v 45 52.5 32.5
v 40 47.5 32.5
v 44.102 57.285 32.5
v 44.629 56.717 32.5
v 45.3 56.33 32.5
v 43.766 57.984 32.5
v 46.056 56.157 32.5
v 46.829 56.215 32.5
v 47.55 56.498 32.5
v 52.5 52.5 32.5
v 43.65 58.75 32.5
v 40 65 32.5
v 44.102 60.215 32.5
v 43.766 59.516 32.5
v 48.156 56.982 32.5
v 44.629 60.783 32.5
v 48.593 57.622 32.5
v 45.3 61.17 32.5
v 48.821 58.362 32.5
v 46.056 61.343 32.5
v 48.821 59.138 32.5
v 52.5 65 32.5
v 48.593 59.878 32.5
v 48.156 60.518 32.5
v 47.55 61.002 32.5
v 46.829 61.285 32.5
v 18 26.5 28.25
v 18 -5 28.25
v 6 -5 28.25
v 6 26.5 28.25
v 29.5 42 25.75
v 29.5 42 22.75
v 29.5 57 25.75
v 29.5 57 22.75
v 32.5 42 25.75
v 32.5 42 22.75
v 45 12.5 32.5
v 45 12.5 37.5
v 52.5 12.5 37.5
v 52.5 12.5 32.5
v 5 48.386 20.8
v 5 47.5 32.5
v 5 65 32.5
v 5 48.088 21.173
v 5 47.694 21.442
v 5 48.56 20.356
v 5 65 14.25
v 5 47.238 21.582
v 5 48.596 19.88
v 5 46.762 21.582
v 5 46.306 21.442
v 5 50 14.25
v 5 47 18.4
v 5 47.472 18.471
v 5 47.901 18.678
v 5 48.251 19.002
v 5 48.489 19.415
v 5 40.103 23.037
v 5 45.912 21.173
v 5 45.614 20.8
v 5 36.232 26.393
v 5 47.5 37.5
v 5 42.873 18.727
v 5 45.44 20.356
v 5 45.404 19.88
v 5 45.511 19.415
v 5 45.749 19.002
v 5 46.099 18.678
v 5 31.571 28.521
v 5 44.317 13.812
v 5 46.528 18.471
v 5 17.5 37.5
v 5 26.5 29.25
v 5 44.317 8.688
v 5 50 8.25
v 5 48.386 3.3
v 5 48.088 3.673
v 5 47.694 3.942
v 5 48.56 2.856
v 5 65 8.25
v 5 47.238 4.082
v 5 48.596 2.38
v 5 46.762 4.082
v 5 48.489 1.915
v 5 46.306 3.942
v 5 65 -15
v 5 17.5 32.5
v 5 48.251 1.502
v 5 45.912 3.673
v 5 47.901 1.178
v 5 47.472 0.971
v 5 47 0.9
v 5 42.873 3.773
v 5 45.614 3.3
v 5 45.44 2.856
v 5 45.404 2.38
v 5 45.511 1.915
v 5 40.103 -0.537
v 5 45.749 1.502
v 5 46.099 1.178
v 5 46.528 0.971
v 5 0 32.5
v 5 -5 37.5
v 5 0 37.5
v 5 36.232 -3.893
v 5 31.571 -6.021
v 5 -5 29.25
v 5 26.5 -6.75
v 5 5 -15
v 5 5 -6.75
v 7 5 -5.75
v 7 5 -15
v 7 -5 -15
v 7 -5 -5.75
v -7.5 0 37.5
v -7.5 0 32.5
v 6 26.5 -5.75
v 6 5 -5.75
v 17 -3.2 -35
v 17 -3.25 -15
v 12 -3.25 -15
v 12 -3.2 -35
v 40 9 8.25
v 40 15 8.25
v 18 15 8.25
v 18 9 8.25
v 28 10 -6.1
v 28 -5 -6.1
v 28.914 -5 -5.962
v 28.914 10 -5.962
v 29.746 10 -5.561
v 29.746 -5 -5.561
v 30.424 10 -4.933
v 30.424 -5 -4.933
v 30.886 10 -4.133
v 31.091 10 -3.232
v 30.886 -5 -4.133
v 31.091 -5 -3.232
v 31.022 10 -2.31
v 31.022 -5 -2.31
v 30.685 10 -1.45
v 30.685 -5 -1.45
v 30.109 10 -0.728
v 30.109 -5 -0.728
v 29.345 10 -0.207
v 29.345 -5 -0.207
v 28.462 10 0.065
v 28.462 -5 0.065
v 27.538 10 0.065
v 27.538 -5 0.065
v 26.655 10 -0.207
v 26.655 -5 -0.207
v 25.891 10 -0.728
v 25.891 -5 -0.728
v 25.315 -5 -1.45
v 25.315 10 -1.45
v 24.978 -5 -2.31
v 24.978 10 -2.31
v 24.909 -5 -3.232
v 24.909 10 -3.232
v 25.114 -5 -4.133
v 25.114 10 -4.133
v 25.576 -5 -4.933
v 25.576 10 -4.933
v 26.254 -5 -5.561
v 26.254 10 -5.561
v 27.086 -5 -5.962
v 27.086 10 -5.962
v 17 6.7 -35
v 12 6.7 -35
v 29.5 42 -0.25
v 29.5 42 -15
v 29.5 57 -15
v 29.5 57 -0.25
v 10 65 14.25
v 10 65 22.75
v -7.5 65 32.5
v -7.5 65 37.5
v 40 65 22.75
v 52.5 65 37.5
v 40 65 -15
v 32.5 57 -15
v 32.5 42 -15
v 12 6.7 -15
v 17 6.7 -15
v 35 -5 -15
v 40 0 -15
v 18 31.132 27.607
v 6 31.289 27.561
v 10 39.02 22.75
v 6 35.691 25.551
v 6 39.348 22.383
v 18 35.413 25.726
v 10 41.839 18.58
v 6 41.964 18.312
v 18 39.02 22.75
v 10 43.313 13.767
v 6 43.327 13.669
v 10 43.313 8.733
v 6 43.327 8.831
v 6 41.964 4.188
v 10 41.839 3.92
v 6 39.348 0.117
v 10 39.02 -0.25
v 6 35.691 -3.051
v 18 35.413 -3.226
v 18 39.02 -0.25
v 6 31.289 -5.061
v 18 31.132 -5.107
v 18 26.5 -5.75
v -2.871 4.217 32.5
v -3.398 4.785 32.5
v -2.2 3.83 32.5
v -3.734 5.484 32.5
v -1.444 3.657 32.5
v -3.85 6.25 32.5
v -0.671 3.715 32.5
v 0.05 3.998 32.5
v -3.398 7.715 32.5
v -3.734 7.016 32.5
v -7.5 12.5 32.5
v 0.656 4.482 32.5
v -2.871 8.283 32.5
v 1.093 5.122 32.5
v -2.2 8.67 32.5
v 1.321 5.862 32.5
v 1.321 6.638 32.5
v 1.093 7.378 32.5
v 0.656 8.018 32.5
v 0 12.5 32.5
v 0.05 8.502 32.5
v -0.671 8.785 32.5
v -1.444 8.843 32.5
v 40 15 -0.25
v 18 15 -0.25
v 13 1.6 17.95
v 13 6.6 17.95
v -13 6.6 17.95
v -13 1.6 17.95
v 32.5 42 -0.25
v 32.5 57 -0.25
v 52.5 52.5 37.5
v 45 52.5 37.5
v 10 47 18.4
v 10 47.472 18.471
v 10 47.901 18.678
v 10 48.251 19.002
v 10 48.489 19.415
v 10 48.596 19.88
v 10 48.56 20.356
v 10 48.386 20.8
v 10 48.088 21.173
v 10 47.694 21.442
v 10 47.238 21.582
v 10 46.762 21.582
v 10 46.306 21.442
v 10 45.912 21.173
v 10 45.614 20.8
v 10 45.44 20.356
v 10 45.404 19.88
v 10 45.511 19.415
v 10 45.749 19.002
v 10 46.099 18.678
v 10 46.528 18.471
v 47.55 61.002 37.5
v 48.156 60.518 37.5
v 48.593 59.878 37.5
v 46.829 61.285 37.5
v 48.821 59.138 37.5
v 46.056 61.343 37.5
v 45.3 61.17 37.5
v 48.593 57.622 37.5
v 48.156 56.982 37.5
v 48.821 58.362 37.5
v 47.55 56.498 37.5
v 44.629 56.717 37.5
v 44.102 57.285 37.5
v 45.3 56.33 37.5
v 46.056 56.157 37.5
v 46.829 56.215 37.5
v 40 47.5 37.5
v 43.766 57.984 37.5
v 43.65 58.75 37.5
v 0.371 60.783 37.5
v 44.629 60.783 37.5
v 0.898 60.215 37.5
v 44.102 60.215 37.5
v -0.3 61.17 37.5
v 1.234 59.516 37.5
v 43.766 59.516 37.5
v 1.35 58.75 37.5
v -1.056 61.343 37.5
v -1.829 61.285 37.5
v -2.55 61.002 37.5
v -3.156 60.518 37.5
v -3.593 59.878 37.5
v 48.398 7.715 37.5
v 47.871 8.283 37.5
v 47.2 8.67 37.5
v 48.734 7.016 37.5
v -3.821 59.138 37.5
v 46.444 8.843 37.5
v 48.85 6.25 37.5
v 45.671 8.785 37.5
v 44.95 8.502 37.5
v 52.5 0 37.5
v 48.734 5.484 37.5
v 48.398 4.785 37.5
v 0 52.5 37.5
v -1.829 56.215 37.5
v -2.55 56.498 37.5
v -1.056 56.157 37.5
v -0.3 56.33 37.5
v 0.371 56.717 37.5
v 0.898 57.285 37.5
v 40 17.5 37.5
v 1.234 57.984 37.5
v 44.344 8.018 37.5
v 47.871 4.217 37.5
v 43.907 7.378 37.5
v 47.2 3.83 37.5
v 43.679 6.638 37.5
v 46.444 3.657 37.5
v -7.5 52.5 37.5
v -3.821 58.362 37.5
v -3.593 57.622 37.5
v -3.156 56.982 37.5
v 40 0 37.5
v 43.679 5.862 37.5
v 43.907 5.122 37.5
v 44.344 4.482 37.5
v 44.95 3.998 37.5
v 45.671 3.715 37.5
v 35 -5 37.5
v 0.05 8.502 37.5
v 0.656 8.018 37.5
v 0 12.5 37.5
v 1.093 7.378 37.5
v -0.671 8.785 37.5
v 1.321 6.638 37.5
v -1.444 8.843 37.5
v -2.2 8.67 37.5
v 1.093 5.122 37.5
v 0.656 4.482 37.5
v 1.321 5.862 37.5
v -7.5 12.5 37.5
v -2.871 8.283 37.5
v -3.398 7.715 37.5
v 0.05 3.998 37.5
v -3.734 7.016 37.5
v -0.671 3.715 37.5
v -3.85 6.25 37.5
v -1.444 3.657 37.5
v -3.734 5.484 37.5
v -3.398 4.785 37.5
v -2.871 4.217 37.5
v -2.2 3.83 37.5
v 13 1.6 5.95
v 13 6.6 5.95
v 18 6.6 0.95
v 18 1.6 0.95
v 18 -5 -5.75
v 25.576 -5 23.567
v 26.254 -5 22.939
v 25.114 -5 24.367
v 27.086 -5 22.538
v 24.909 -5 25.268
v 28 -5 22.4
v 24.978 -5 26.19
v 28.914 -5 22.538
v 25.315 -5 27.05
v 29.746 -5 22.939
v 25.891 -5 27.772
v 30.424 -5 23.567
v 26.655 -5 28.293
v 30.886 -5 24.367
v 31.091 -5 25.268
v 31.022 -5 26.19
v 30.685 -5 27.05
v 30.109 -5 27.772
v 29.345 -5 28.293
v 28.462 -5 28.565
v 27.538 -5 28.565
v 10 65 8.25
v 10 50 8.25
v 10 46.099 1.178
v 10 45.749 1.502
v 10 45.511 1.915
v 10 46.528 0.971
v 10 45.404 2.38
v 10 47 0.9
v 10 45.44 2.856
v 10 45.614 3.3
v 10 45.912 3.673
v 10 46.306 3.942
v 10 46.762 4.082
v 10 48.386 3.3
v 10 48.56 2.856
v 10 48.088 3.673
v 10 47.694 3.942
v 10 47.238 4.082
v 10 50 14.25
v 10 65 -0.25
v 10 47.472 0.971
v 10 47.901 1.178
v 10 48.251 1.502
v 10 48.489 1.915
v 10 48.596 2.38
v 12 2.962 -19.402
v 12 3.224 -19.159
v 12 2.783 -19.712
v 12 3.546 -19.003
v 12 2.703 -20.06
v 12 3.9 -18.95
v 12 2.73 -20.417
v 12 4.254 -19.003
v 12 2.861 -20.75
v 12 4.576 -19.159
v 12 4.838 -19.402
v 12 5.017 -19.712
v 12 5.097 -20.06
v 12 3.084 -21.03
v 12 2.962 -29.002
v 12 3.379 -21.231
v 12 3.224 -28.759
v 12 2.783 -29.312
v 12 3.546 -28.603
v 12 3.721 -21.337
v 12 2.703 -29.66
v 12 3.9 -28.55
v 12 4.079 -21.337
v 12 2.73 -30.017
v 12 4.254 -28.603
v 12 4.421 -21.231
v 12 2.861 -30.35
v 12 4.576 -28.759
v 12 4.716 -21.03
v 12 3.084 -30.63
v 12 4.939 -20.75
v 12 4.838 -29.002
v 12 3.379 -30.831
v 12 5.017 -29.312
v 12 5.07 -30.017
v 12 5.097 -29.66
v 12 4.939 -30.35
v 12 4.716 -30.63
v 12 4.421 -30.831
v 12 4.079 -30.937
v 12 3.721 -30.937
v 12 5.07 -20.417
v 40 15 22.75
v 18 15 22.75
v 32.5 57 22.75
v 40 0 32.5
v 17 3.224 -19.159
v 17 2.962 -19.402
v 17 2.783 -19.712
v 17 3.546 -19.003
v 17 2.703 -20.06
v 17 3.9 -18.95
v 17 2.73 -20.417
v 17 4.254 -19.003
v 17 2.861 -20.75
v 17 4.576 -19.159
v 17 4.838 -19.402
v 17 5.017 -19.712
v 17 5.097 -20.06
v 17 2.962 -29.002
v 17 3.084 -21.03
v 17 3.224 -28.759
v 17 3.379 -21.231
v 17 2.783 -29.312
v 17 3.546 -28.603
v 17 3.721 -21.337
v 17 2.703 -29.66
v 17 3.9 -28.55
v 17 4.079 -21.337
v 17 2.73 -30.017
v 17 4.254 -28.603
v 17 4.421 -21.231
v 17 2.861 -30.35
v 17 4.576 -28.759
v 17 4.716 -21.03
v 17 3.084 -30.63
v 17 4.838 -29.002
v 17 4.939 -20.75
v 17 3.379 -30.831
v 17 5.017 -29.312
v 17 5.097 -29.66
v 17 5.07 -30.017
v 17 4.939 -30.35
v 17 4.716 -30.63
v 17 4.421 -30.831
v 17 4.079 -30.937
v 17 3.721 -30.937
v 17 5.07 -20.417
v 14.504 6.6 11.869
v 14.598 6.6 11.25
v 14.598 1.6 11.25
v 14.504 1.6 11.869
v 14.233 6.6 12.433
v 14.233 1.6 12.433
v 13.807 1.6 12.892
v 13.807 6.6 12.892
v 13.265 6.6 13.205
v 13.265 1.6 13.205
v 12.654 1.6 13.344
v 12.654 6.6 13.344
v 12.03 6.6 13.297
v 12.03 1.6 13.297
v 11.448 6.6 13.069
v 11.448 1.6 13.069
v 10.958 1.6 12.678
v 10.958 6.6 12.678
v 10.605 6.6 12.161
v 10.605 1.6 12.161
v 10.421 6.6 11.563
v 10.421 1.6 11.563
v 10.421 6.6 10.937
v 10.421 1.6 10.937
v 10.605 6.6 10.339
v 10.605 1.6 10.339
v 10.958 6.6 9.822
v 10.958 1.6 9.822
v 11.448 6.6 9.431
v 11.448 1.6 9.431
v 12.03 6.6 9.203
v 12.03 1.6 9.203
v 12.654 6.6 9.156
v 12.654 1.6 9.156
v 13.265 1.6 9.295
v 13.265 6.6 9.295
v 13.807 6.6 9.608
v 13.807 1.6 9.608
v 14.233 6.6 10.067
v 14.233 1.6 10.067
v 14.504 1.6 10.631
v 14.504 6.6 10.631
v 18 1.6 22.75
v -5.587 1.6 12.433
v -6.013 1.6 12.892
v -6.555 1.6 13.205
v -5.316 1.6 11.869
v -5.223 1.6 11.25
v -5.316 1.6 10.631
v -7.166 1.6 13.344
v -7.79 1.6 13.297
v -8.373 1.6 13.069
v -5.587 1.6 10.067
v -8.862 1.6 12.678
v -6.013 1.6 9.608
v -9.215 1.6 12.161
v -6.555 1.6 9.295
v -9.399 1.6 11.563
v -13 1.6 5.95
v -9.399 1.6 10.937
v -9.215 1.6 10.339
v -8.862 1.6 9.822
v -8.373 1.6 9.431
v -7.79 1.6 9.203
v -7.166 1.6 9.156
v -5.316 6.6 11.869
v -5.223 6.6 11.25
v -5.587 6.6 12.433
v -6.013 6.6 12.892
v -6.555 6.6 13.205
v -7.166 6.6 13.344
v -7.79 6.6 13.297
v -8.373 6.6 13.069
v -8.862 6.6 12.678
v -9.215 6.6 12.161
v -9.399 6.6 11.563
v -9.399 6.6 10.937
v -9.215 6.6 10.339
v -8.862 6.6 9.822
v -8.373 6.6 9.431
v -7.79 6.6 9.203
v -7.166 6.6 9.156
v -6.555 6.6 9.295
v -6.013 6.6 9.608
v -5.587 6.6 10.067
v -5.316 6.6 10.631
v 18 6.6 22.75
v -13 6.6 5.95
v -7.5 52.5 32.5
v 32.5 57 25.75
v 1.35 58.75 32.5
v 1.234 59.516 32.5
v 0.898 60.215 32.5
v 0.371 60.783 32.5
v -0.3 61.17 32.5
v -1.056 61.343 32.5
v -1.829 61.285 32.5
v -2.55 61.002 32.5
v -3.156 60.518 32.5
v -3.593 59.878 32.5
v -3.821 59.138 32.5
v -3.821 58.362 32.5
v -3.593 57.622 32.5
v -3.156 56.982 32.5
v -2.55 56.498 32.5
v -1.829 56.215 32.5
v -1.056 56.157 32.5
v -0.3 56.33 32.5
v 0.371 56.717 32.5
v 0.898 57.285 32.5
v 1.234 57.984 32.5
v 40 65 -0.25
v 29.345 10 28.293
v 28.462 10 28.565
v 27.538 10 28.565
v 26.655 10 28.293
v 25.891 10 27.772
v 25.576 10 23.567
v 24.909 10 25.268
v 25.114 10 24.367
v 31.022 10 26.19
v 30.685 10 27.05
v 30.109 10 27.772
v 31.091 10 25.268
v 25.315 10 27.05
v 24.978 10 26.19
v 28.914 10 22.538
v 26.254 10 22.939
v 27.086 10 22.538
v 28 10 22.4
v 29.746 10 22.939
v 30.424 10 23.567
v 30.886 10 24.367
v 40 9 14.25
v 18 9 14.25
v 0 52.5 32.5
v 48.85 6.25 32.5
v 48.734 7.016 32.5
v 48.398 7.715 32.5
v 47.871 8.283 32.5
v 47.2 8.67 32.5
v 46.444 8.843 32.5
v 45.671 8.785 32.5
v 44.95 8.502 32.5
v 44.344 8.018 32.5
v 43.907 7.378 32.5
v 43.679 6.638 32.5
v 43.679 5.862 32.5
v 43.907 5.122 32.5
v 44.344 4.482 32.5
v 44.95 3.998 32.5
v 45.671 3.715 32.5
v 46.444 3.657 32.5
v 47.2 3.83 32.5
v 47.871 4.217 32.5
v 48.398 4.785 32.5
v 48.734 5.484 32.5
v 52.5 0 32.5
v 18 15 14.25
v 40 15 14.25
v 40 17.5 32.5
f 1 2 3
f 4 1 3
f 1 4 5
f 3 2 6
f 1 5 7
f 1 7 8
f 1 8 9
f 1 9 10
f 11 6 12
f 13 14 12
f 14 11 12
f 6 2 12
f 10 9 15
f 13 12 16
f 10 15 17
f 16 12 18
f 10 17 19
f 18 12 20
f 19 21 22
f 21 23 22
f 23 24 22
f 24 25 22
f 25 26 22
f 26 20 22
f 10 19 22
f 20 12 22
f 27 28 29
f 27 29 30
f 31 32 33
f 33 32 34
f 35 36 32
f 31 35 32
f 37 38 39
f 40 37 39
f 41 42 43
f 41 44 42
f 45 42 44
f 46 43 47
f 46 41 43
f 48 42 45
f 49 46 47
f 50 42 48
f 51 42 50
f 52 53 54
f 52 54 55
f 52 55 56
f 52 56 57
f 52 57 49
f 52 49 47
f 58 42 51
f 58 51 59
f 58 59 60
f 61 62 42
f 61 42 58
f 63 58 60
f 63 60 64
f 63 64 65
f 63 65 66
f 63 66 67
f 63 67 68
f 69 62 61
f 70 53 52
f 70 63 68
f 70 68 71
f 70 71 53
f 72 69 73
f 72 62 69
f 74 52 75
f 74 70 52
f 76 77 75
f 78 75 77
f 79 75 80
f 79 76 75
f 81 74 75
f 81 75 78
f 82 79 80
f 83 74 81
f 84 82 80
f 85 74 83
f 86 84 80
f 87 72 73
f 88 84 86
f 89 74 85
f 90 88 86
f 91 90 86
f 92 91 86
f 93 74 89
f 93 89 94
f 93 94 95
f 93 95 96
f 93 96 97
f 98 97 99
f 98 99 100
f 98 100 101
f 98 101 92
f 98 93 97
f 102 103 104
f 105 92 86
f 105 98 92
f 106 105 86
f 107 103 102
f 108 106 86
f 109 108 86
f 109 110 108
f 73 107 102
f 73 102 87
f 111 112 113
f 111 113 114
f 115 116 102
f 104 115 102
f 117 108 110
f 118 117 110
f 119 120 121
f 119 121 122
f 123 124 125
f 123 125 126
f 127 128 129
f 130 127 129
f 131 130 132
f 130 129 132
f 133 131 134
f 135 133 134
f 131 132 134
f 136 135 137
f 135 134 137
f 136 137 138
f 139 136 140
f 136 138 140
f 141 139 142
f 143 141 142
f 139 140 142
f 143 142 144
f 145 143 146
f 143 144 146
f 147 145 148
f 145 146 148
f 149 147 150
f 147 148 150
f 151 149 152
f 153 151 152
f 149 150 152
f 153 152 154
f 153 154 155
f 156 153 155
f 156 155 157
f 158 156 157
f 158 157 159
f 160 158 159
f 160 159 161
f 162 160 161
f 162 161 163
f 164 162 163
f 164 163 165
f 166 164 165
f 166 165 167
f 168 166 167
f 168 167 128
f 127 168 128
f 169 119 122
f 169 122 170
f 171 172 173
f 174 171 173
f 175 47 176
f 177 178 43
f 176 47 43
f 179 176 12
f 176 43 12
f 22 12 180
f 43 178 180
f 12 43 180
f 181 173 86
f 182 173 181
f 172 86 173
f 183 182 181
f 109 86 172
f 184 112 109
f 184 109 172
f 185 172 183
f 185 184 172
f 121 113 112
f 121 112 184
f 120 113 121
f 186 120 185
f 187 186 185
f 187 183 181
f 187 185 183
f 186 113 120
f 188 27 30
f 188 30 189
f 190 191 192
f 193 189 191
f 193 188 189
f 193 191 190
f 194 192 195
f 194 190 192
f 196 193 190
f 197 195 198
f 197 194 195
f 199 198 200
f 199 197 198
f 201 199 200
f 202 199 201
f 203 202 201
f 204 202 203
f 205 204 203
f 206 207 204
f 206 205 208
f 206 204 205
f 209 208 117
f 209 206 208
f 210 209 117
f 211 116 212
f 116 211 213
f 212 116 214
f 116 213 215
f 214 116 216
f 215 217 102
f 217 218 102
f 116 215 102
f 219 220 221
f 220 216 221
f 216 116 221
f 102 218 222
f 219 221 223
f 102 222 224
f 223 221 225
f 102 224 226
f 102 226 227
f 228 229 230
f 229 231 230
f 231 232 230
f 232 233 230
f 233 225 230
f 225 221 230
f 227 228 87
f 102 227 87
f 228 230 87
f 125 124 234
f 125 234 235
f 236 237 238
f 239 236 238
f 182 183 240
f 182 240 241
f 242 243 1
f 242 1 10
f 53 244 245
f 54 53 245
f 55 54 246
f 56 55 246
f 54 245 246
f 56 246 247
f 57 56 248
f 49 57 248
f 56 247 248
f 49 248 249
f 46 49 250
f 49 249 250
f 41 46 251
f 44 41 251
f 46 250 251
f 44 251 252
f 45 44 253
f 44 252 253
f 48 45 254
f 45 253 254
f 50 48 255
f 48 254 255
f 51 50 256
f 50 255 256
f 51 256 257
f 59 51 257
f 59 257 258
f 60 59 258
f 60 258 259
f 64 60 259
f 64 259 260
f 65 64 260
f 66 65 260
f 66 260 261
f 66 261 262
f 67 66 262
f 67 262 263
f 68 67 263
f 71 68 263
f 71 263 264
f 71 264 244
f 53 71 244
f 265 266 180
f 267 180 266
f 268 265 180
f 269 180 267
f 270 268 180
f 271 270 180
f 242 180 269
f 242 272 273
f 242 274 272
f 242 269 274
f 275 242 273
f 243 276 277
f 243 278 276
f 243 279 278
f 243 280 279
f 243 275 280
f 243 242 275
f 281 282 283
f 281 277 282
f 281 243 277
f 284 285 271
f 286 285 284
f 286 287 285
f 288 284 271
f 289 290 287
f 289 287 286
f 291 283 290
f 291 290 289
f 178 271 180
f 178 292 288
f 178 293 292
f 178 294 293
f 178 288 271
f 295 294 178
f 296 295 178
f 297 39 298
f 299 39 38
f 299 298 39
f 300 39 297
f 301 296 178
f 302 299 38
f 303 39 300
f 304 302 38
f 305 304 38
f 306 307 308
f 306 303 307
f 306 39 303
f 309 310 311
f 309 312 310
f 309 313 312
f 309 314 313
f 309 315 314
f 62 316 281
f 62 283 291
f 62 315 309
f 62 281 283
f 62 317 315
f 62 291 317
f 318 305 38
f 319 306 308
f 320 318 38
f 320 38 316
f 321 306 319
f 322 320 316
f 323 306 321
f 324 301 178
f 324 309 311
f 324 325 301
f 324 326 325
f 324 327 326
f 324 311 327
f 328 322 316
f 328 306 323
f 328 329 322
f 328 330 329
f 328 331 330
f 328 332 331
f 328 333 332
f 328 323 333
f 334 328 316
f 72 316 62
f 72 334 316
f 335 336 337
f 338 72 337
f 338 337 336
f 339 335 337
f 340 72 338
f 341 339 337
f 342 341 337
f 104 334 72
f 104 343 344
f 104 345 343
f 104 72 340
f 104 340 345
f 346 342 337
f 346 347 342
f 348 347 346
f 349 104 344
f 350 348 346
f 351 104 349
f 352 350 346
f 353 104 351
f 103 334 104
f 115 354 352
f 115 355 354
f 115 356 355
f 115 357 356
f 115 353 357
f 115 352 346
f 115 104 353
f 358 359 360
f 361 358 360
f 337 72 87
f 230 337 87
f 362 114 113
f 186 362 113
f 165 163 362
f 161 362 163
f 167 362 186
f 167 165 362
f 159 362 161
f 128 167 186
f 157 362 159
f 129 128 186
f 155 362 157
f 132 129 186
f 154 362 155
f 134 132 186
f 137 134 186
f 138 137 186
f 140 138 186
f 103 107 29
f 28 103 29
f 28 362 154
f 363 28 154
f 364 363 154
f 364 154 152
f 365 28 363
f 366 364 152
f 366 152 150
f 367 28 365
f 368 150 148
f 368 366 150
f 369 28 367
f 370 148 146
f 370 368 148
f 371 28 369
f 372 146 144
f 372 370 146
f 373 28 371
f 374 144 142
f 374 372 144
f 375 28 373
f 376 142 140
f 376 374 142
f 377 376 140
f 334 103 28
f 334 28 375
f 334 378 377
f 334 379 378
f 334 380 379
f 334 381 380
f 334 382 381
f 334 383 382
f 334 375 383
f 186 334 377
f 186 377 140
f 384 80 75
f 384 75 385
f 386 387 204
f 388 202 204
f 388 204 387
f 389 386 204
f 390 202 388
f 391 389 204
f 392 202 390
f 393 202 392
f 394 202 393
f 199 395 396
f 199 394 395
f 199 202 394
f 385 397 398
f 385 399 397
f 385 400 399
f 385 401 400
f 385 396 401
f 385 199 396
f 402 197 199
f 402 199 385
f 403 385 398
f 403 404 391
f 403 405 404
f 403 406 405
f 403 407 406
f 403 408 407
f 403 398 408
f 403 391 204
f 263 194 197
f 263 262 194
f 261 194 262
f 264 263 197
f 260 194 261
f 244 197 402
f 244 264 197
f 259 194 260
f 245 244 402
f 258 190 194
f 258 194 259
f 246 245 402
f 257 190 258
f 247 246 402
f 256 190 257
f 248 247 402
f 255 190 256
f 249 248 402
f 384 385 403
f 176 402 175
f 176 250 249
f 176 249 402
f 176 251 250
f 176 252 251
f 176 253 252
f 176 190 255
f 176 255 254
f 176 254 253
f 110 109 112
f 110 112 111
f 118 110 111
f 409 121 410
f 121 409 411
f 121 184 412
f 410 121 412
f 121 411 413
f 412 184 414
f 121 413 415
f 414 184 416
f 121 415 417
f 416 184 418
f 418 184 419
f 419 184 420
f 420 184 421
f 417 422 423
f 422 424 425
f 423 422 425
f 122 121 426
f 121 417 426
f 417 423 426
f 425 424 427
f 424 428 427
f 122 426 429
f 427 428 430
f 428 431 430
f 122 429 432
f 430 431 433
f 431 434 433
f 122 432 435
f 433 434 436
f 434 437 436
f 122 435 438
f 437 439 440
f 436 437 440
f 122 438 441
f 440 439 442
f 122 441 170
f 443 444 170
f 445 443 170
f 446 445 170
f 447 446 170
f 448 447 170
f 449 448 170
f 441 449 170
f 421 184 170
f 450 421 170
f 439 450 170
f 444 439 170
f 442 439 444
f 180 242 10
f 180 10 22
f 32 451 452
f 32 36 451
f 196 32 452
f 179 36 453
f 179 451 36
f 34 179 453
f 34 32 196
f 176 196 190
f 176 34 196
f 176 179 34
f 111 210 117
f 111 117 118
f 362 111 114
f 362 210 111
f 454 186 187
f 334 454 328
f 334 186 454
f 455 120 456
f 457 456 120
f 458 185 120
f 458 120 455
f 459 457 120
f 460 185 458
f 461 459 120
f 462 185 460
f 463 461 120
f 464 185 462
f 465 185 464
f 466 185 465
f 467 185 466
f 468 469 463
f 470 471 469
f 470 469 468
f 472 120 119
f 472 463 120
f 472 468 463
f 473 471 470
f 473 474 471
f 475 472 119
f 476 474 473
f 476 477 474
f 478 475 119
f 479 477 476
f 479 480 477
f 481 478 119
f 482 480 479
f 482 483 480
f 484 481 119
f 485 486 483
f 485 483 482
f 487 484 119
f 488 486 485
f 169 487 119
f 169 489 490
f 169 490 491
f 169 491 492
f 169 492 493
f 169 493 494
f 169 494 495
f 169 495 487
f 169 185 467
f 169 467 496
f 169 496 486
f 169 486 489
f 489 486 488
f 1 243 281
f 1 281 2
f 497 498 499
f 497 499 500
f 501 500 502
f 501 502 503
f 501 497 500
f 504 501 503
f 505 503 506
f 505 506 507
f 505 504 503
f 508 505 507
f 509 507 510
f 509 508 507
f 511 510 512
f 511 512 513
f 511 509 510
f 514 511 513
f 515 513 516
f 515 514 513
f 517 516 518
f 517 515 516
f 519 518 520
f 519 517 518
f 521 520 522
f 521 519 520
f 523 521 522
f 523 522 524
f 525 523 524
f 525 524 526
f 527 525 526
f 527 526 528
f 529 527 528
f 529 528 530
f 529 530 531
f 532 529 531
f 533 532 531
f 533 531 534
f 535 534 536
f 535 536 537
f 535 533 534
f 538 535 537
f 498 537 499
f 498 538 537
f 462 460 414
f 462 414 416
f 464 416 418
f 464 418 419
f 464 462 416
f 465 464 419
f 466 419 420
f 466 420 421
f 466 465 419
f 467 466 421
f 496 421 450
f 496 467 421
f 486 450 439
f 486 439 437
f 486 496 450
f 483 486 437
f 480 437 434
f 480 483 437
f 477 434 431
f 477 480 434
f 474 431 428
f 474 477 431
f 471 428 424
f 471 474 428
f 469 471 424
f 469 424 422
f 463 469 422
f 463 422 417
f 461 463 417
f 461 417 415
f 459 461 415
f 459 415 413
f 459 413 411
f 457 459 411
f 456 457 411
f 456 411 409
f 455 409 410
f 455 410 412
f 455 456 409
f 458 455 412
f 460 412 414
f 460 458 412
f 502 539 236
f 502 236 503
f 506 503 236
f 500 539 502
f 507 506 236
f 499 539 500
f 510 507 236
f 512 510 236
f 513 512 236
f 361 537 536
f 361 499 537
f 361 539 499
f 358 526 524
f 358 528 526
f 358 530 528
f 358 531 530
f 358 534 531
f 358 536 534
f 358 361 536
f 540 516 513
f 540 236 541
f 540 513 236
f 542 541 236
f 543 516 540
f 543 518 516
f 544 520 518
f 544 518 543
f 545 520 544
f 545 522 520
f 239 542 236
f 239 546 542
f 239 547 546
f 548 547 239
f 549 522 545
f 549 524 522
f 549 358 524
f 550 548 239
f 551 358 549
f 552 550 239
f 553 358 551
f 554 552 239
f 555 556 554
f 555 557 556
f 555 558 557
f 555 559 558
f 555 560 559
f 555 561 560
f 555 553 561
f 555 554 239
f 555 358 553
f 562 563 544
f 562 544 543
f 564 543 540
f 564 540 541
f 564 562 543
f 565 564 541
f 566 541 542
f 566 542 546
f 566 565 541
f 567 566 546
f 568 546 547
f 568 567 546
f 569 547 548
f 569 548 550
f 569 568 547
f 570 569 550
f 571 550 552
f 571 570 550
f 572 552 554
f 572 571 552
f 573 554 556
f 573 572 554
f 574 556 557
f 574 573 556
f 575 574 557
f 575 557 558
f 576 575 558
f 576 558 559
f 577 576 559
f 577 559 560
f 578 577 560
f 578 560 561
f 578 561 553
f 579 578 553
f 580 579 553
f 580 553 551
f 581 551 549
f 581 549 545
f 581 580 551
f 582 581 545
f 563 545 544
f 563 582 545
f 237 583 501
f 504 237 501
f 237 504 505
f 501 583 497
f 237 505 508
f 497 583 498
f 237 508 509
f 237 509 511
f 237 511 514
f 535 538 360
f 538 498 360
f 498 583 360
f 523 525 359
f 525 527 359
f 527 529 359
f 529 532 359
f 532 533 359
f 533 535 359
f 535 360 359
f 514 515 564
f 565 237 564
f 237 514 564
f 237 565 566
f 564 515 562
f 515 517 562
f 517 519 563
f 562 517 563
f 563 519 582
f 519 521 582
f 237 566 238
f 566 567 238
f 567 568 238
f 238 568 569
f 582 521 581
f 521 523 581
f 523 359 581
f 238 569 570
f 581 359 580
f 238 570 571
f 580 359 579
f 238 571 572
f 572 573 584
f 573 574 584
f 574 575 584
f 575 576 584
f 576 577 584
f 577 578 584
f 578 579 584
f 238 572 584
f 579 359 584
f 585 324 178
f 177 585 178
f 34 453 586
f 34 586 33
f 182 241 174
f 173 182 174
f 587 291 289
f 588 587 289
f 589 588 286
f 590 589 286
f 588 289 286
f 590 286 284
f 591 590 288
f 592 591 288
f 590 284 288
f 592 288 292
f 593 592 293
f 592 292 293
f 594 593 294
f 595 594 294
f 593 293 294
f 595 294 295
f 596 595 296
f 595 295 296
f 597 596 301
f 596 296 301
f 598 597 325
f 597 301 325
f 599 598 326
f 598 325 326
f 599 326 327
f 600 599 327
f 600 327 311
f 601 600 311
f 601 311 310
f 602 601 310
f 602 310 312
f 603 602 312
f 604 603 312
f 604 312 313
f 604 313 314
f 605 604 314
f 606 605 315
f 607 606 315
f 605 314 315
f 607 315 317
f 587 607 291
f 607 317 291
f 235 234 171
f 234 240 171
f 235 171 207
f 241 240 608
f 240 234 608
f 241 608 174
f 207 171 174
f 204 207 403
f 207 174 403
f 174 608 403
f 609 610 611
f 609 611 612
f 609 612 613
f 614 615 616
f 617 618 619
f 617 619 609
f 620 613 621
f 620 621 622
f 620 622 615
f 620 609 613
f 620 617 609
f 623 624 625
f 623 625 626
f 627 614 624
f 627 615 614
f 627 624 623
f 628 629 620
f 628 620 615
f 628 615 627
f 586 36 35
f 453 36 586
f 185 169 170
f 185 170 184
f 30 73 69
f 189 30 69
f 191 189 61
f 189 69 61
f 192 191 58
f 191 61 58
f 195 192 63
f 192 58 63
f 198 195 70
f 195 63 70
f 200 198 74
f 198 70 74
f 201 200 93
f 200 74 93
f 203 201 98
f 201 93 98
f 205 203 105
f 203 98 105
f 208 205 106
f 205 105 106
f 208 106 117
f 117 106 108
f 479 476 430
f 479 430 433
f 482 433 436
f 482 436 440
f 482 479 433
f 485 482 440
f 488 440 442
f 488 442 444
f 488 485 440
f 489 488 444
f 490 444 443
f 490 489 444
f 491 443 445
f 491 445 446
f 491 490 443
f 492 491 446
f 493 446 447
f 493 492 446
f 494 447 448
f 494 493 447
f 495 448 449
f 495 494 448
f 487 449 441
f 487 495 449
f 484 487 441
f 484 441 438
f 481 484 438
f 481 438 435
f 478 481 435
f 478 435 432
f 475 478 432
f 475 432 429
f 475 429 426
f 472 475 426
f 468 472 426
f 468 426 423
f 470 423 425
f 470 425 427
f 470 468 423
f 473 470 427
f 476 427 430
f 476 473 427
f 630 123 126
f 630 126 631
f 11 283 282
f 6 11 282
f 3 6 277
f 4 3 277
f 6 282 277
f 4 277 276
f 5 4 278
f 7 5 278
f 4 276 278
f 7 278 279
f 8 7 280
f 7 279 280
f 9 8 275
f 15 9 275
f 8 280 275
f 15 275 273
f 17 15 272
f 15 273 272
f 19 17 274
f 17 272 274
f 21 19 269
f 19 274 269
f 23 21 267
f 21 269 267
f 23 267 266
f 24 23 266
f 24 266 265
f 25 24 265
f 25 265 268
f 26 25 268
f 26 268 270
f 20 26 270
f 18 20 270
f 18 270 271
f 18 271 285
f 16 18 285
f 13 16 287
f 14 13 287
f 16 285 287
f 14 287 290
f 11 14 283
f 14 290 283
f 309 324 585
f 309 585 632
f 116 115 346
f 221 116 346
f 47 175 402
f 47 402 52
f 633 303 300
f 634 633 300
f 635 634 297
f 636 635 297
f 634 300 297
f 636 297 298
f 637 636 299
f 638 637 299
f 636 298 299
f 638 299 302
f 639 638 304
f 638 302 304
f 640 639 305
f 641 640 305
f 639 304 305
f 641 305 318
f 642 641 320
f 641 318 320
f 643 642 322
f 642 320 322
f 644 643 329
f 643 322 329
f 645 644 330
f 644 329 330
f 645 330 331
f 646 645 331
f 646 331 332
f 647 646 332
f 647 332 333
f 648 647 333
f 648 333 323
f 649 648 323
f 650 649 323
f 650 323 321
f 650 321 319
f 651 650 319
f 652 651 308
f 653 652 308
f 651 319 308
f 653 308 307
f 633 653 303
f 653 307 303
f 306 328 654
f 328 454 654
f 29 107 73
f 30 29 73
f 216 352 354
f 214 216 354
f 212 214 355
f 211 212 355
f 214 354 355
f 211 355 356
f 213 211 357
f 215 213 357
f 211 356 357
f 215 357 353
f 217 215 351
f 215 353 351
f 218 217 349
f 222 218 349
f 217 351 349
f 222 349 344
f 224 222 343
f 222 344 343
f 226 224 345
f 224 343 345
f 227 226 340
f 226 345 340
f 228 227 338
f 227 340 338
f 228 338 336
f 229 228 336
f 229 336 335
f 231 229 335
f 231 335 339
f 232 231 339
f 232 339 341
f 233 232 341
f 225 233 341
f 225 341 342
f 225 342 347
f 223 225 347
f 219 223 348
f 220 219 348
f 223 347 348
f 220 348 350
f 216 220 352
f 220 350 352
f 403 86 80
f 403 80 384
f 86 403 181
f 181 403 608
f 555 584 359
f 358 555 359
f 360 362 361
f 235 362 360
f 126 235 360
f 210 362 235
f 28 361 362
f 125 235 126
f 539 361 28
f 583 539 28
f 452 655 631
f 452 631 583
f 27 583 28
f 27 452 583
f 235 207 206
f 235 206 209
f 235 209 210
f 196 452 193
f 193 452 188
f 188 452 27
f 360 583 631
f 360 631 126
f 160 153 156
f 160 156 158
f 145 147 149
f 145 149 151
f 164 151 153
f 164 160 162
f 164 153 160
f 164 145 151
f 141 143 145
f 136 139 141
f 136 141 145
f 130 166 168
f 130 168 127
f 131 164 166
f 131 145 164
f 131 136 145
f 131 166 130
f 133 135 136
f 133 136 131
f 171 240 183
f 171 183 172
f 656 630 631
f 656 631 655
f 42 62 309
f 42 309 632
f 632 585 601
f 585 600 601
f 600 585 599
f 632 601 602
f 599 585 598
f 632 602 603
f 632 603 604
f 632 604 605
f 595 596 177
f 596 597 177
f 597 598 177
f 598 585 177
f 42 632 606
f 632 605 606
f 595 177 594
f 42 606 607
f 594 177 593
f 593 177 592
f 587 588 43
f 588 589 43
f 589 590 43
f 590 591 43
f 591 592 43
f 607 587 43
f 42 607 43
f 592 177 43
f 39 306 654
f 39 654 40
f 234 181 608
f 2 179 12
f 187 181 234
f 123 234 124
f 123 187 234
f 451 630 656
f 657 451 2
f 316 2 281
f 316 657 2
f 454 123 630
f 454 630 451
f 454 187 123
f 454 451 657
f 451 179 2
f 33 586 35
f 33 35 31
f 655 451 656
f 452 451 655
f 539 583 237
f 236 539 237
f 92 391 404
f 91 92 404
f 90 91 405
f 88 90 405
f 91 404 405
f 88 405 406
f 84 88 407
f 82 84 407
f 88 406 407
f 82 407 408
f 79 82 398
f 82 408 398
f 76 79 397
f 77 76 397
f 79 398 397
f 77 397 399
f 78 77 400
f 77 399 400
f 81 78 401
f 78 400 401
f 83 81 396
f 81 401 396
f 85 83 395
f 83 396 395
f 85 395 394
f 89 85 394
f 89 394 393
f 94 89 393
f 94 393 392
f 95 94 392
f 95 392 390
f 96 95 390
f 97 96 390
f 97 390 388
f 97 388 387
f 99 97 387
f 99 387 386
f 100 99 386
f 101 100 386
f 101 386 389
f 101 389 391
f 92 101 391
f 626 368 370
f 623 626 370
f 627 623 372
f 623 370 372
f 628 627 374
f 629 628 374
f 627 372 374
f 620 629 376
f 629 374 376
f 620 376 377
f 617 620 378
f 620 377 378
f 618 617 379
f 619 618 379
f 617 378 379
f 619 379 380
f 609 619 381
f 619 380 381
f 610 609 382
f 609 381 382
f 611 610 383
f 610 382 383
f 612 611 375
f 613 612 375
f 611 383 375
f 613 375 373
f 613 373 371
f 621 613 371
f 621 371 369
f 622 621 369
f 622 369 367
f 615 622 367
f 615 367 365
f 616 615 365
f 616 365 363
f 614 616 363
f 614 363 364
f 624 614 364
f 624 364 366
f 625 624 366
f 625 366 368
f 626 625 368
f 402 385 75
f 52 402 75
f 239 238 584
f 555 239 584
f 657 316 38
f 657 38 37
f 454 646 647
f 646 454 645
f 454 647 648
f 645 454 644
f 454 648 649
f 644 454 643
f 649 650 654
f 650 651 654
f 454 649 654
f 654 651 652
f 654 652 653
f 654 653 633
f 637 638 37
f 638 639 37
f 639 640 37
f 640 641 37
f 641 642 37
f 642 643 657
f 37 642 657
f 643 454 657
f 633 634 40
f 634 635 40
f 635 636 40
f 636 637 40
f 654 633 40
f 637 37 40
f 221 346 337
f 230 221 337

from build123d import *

# Parameters (mm, degrees)
BOSS_EXTRUDE1_DEPTH      = 42.5
BOSS_EXTRUDE1_DEPTH_BACK = 15
SKETCH1_W                = 40
SKETCH1_H                = 65
SKETCH3_W                = 22.5
SKETCH3_H                = 50
CUT_EXTRUDE2_DEPTH       = 30
SKETCH4_R                = 4.5
CUT_EXTRUDE3_DEPTH       = 10
SKETCH6_W                = 40
SKETCH6_H                = 65
CUT_EXTRUDE4_DEPTH       = 5
SKETCH7_R                = 3.1
CUT_EXTRUDE5_DEPTH       = 10
SKETCH8_W                = 52.5
SKETCH8_H                = 65
CUT_EXTRUDE6_DEPTH       = 5
SKETCH9_W                = 12.5
SKETCH9_H                = 12.5
SKETCH9_R                = 2.6
BOSS_EXTRUDE2_DEPTH      = 5
BOSS_EXTRUDE3_START      = 5
SKETCH10_R               = 3.1
BOSS_EXTRUDE3_DEPTH      = 5
SKETCH11_R               = 1.6
CUT_EXTRUDE7_DEPTH       = 87.240941553
CUT_EXTRUDE8_DEPTH       = 11.5
CUT_EXTRUDE8_DEPTH_BACK  = 11.5
SKETCH12_W               = 30
SKETCH12_H               = 50
CUT_EXTRUDE9_DEPTH       = 30
CUT_EXTRUDE10_DEPTH      = 15
CUT_EXTRUDE11_START      = -13
SKETCH15_R               = 17
SKETCH15_R_2             = 4.5
CUT_EXTRUDE11_DEPTH      = 13
CHAMFER1_SIZE            = 1
SKETCH16_W               = 9.25
SKETCH16_H               = 10
CUT_EXTRUDE12_DEPTH      = 2
SKETCH17_R               = 2.1
BOSS_EXTRUDE4_DEPTH      = 5
CHAMFER2_SIZE            = 5
CHAMFER3_SIZE            = 5
CHAMFER4_SIZE            = 5
SKETCH18_W               = 3
SKETCH18_H               = 15
CUT_EXTRUDE13_DEPTH      = 40.75
SKETCH20_R               = 1.2
BOSS_EXTRUDE5_DEPTH      = 5


with BuildPart() as part:
    # Sketch1 → Boss-Extrude1 (new, two sides: drawn at the far end of the back side and taken through both)
    with BuildSketch(Plane.XY.offset(-BOSS_EXTRUDE1_DEPTH_BACK)):
        with Locations((20, 32.5)):
            Rectangle(SKETCH1_W, SKETCH1_H)
    extrude(amount=BOSS_EXTRUDE1_DEPTH + BOSS_EXTRUDE1_DEPTH_BACK)

    # Sketch3 → Cut-Extrude2 (cut)
    with BuildSketch(Plane(origin=(40, 0, 0), x_dir=(0, 0, -1), z_dir=(1, 0, 0))):
        with Locations((-11.25, 40)):
            Rectangle(SKETCH3_W, SKETCH3_H)
    extrude(amount=-CUT_EXTRUDE2_DEPTH, mode=Mode.SUBTRACT)

    # Sketch4 → Cut-Extrude3 (cut)
    with BuildSketch(Plane(origin=(10, 0, 0), x_dir=(0, 0, -1), z_dir=(1, 0, 0))):
        with Locations((-11.25, 26.5)):
            Circle(SKETCH4_R)
    extrude(amount=-CUT_EXTRUDE3_DEPTH, mode=Mode.SUBTRACT)

    # Sketch6 → Cut-Extrude4 (cut)
    with BuildSketch(Plane.XY.offset(42.5)):
        with Locations((20, 32.5)):
            Rectangle(SKETCH6_W, SKETCH6_H)
    extrude(amount=-CUT_EXTRUDE4_DEPTH, mode=Mode.SUBTRACT)

    # Sketch7 → Cut-Extrude5 (cut)
    with BuildSketch(Plane.XZ):
        with Locations(Location((28, 25.5, 0), (0, 0, 270))):
            Circle(SKETCH7_R)
        with Locations(Location((28, -3, 0), (0, 0, 270))):
            Circle(SKETCH7_R)
    extrude(amount=-CUT_EXTRUDE5_DEPTH, mode=Mode.SUBTRACT)

    # Sketch8 → Cut-Extrude6 (cut)
    with BuildSketch(Plane.ZY):
        with Locations((11.25, 32.5)):
            Rectangle(SKETCH8_W, SKETCH8_H)
    extrude(amount=-CUT_EXTRUDE6_DEPTH, mode=Mode.SUBTRACT)

    # Sketch9 → Boss-Extrude2 (add)
    # profile 1 of 4: a face of its own
    with BuildSketch(Plane.XY.offset(37.5)):
        with Locations((-1.25, 58.75)):
            Rectangle(SKETCH9_W, SKETCH9_H)
        with Locations((-1.25, 58.75)):
            Circle(SKETCH9_R, mode=Mode.SUBTRACT)
    # profile 2 of 4: a face of its own
    with BuildSketch(Plane.XY.offset(37.5)):
        with Locations((46.25, 58.75)):
            Rectangle(SKETCH9_W, SKETCH9_H)
        with Locations(Location((46.25, 58.75, 0), (0, 0, 180))):
            Circle(SKETCH9_R, mode=Mode.SUBTRACT)
    # profile 3 of 4: a face of its own
    with BuildSketch(Plane.XY.offset(37.5)):
        with Locations((46.25, 6.25)):
            Rectangle(SKETCH9_W, SKETCH9_H)
        with Locations((46.25, 6.25)):
            Circle(SKETCH9_R, mode=Mode.SUBTRACT)
    # profile 4 of 4: a face of its own
    with BuildSketch(Plane.XY.offset(37.5)):
        with Locations((-1.25, 6.25)):
            Rectangle(SKETCH9_W, SKETCH9_H)
        with Locations(Location((-1.25, 6.25, 0), (0, 0, 180))):
            Circle(SKETCH9_R, mode=Mode.SUBTRACT)
    extrude(amount=-BOSS_EXTRUDE2_DEPTH)

    # Sketch10 → Boss-Extrude3 (add)
    with BuildSketch(Plane.XZ.offset(BOSS_EXTRUDE3_START)):
        Polygon((40, 32.5), (40, 37.5), (5, 37.5), (5, -15), (40, -15), align=None)
        with Locations(Location((28, 25.5, 0), (0, 0, 270))):
            Circle(SKETCH10_R, mode=Mode.SUBTRACT)
        with Locations(Location((28, -3, 0), (0, 0, 270))):
            Circle(SKETCH10_R, mode=Mode.SUBTRACT)
    extrude(amount=-BOSS_EXTRUDE3_DEPTH)

    # Sketch11 → Cut-Extrude7 (cut, through all)
    with BuildSketch(Plane(origin=(10, 0, 0), x_dir=(0, 0, -1), z_dir=(1, 0, 0))):
        with Locations((-2.5, 47)):
            Circle(SKETCH11_R)
        with Locations((-20, 47)):
            Circle(SKETCH11_R)
    extrude(amount=-CUT_EXTRUDE7_DEPTH, mode=Mode.SUBTRACT)

    # Sketch12 → Cut-Extrude8 (cut, two sides: drawn at the far end of the back side and taken through both)
    with BuildSketch(Plane(origin=(0, 0, 11.25), x_dir=(-1, 0, 0), z_dir=(0, 0, -1)).offset(-CUT_EXTRUDE8_DEPTH_BACK)):
        with Locations((-25, 40)):
            Rectangle(SKETCH12_W, SKETCH12_H)
    extrude(amount=CUT_EXTRUDE8_DEPTH + CUT_EXTRUDE8_DEPTH_BACK, mode=Mode.SUBTRACT)

    # Sketch13 → Cut-Extrude9 (cut)
    with BuildSketch(Plane(origin=(40, 0, 0), x_dir=(0, 0, -1), z_dir=(1, 0, 0))):
        Polygon((-11.25, 15), (-8.25, 15), (-8.25, 9), (-14.25, 9), (-14.25, 15), align=None)
    extrude(amount=-CUT_EXTRUDE9_DEPTH, mode=Mode.SUBTRACT)

    # Sketch14 → Cut-Extrude10 (cut)
    with BuildSketch(Plane(origin=(0, 65, 0), x_dir=(1, 0, 0), z_dir=(0, 1, 0))):
        Polygon((5, -11.25), (5, -8.25), (10, -8.25), (10, -14.25), (5, -14.25), align=None)
    extrude(amount=-CUT_EXTRUDE10_DEPTH, mode=Mode.SUBTRACT)

    # Sketch15 → Cut-Extrude11 (cut)
    # profile 1 of 2: a face of its own
    with BuildSketch(Plane.ZY.offset(-5).offset(CUT_EXTRUDE11_START)):
        with Locations((11.25, 26.5)):
            Circle(SKETCH15_R)
        with Locations((11.25, 26.5)):
            Circle(SKETCH15_R_2, mode=Mode.SUBTRACT)
    # profile 2 of 2: a face of its own
    with BuildSketch(Plane.ZY.offset(-5).offset(CUT_EXTRUDE11_START)):
        with BuildLine():
            Line((-5.75, 26.5), (-5.75, -5))
            Line((-5.75, -5), (28.25, -5))
            Line((28.25, -5), (28.25, 26.5))
            ThreePointArc((28.25, 26.5), (11.25, 9.5), (-5.75, 26.5))
        make_face()
    extrude(amount=CUT_EXTRUDE11_DEPTH, mode=Mode.SUBTRACT)

    # Chamfer1
    chamfer1_edges = [part.edges().sort_by_distance(p)[0] for p in [
        (5, 10.75, -5.75),
        (5, 43.5, 11.25),
        (5, 10.75, 28.25),
    ]]
    chamfer(chamfer1_edges, length=CHAMFER1_SIZE)

    # Sketch16 → Cut-Extrude12 (cut)
    with BuildSketch(Plane.ZY.offset(-5)):
        with Locations((-10.375, 0)):
            Rectangle(SKETCH16_W, SKETCH16_H)
    extrude(amount=-CUT_EXTRUDE12_DEPTH, mode=Mode.SUBTRACT)

    # Sketch17 → Boss-Extrude4 (add)
    # profile 1 of 3: a face of its own
    with BuildSketch(Plane(origin=(69.218616892, 6.6, 8.180920591), x_dir=(-1, 0, 0), z_dir=(0, -1, 0))):
        Polygon((51.218616892, 7.230920591), (51.218616892, 2.230920591), (56.218616892, 2.230920591), align=None)
    # profile 2 of 3: a face of its own
    with BuildSketch(Plane(origin=(69.218616892, 6.6, 8.180920591), x_dir=(-1, 0, 0), z_dir=(0, -1, 0))):
        Polygon((56.218616892, -9.769079409), (51.218616892, -9.769079409), (51.218616892, -14.569079409), align=None)
    # profile 3 of 3: a face of its own
    with BuildSketch(Plane(origin=(69.218616892, 6.6, 8.180920591), x_dir=(-1, 0, 0), z_dir=(0, -1, 0))):
        Polygon((56.218616892, 2.230920591), (51.218616892, 2.230920591), (51.218616892, -9.769079409), (56.218616892, -9.769079409), (82.218616892, -9.769079409), (82.218616892, 2.230920591), align=None)
        with Locations(Location((56.721116892, -3.069079409, 0), (0, 0, 180))):
            Circle(SKETCH17_R, mode=Mode.SUBTRACT)
        with Locations(Location((76.541116892, -3.069079409, 0), (0, 0, 180))):
            Circle(SKETCH17_R, mode=Mode.SUBTRACT)
    extrude(amount=BOSS_EXTRUDE4_DEPTH)

    # Chamfer2
    chamfer2_edges = [part.edges().sort_by_distance(p)[0] for p in [
        (40, -5, 11.25),
    ]]
    chamfer(chamfer2_edges, length=CHAMFER2_SIZE)

    # Chamfer3
    chamfer3_edges = [part.edges().sort_by_distance(p)[0] for p in [
        (40, 52.5, 35),
        (40, 12.5, 35),
    ]]
    chamfer(chamfer3_edges, length=CHAMFER3_SIZE)

    # Chamfer4
    chamfer4_edges = [part.edges().sort_by_distance(p)[0] for p in [
        (5, 12.5, 35),
        (5, 52.5, 35),
    ]]
    chamfer(chamfer4_edges, length=CHAMFER4_SIZE)

    # Sketch18 → Cut-Extrude13 (cut)
    with BuildSketch(Plane(origin=(0, 0, -15), x_dir=(-1, 0, 0), z_dir=(0, 0, -1))):
        with Locations((-31, 49.5)):
            Rectangle(SKETCH18_W, SKETCH18_H)
    extrude(amount=-CUT_EXTRUDE13_DEPTH, mode=Mode.SUBTRACT)

    # Sketch20 → Boss-Extrude5 (add)
    with BuildSketch(Plane.ZY.offset(-17)):
        Polygon((-15, -3.25), (-35, -3.2), (-35, 6.7), (-15, 6.7), align=None)
        with Locations((-29.75, 3.9)):
            Circle(SKETCH20_R, mode=Mode.SUBTRACT)
        with Locations((-20.15, 3.9)):
            Circle(SKETCH20_R, mode=Mode.SUBTRACT)
    extrude(amount=BOSS_EXTRUDE5_DEPTH)


solid = part.part
